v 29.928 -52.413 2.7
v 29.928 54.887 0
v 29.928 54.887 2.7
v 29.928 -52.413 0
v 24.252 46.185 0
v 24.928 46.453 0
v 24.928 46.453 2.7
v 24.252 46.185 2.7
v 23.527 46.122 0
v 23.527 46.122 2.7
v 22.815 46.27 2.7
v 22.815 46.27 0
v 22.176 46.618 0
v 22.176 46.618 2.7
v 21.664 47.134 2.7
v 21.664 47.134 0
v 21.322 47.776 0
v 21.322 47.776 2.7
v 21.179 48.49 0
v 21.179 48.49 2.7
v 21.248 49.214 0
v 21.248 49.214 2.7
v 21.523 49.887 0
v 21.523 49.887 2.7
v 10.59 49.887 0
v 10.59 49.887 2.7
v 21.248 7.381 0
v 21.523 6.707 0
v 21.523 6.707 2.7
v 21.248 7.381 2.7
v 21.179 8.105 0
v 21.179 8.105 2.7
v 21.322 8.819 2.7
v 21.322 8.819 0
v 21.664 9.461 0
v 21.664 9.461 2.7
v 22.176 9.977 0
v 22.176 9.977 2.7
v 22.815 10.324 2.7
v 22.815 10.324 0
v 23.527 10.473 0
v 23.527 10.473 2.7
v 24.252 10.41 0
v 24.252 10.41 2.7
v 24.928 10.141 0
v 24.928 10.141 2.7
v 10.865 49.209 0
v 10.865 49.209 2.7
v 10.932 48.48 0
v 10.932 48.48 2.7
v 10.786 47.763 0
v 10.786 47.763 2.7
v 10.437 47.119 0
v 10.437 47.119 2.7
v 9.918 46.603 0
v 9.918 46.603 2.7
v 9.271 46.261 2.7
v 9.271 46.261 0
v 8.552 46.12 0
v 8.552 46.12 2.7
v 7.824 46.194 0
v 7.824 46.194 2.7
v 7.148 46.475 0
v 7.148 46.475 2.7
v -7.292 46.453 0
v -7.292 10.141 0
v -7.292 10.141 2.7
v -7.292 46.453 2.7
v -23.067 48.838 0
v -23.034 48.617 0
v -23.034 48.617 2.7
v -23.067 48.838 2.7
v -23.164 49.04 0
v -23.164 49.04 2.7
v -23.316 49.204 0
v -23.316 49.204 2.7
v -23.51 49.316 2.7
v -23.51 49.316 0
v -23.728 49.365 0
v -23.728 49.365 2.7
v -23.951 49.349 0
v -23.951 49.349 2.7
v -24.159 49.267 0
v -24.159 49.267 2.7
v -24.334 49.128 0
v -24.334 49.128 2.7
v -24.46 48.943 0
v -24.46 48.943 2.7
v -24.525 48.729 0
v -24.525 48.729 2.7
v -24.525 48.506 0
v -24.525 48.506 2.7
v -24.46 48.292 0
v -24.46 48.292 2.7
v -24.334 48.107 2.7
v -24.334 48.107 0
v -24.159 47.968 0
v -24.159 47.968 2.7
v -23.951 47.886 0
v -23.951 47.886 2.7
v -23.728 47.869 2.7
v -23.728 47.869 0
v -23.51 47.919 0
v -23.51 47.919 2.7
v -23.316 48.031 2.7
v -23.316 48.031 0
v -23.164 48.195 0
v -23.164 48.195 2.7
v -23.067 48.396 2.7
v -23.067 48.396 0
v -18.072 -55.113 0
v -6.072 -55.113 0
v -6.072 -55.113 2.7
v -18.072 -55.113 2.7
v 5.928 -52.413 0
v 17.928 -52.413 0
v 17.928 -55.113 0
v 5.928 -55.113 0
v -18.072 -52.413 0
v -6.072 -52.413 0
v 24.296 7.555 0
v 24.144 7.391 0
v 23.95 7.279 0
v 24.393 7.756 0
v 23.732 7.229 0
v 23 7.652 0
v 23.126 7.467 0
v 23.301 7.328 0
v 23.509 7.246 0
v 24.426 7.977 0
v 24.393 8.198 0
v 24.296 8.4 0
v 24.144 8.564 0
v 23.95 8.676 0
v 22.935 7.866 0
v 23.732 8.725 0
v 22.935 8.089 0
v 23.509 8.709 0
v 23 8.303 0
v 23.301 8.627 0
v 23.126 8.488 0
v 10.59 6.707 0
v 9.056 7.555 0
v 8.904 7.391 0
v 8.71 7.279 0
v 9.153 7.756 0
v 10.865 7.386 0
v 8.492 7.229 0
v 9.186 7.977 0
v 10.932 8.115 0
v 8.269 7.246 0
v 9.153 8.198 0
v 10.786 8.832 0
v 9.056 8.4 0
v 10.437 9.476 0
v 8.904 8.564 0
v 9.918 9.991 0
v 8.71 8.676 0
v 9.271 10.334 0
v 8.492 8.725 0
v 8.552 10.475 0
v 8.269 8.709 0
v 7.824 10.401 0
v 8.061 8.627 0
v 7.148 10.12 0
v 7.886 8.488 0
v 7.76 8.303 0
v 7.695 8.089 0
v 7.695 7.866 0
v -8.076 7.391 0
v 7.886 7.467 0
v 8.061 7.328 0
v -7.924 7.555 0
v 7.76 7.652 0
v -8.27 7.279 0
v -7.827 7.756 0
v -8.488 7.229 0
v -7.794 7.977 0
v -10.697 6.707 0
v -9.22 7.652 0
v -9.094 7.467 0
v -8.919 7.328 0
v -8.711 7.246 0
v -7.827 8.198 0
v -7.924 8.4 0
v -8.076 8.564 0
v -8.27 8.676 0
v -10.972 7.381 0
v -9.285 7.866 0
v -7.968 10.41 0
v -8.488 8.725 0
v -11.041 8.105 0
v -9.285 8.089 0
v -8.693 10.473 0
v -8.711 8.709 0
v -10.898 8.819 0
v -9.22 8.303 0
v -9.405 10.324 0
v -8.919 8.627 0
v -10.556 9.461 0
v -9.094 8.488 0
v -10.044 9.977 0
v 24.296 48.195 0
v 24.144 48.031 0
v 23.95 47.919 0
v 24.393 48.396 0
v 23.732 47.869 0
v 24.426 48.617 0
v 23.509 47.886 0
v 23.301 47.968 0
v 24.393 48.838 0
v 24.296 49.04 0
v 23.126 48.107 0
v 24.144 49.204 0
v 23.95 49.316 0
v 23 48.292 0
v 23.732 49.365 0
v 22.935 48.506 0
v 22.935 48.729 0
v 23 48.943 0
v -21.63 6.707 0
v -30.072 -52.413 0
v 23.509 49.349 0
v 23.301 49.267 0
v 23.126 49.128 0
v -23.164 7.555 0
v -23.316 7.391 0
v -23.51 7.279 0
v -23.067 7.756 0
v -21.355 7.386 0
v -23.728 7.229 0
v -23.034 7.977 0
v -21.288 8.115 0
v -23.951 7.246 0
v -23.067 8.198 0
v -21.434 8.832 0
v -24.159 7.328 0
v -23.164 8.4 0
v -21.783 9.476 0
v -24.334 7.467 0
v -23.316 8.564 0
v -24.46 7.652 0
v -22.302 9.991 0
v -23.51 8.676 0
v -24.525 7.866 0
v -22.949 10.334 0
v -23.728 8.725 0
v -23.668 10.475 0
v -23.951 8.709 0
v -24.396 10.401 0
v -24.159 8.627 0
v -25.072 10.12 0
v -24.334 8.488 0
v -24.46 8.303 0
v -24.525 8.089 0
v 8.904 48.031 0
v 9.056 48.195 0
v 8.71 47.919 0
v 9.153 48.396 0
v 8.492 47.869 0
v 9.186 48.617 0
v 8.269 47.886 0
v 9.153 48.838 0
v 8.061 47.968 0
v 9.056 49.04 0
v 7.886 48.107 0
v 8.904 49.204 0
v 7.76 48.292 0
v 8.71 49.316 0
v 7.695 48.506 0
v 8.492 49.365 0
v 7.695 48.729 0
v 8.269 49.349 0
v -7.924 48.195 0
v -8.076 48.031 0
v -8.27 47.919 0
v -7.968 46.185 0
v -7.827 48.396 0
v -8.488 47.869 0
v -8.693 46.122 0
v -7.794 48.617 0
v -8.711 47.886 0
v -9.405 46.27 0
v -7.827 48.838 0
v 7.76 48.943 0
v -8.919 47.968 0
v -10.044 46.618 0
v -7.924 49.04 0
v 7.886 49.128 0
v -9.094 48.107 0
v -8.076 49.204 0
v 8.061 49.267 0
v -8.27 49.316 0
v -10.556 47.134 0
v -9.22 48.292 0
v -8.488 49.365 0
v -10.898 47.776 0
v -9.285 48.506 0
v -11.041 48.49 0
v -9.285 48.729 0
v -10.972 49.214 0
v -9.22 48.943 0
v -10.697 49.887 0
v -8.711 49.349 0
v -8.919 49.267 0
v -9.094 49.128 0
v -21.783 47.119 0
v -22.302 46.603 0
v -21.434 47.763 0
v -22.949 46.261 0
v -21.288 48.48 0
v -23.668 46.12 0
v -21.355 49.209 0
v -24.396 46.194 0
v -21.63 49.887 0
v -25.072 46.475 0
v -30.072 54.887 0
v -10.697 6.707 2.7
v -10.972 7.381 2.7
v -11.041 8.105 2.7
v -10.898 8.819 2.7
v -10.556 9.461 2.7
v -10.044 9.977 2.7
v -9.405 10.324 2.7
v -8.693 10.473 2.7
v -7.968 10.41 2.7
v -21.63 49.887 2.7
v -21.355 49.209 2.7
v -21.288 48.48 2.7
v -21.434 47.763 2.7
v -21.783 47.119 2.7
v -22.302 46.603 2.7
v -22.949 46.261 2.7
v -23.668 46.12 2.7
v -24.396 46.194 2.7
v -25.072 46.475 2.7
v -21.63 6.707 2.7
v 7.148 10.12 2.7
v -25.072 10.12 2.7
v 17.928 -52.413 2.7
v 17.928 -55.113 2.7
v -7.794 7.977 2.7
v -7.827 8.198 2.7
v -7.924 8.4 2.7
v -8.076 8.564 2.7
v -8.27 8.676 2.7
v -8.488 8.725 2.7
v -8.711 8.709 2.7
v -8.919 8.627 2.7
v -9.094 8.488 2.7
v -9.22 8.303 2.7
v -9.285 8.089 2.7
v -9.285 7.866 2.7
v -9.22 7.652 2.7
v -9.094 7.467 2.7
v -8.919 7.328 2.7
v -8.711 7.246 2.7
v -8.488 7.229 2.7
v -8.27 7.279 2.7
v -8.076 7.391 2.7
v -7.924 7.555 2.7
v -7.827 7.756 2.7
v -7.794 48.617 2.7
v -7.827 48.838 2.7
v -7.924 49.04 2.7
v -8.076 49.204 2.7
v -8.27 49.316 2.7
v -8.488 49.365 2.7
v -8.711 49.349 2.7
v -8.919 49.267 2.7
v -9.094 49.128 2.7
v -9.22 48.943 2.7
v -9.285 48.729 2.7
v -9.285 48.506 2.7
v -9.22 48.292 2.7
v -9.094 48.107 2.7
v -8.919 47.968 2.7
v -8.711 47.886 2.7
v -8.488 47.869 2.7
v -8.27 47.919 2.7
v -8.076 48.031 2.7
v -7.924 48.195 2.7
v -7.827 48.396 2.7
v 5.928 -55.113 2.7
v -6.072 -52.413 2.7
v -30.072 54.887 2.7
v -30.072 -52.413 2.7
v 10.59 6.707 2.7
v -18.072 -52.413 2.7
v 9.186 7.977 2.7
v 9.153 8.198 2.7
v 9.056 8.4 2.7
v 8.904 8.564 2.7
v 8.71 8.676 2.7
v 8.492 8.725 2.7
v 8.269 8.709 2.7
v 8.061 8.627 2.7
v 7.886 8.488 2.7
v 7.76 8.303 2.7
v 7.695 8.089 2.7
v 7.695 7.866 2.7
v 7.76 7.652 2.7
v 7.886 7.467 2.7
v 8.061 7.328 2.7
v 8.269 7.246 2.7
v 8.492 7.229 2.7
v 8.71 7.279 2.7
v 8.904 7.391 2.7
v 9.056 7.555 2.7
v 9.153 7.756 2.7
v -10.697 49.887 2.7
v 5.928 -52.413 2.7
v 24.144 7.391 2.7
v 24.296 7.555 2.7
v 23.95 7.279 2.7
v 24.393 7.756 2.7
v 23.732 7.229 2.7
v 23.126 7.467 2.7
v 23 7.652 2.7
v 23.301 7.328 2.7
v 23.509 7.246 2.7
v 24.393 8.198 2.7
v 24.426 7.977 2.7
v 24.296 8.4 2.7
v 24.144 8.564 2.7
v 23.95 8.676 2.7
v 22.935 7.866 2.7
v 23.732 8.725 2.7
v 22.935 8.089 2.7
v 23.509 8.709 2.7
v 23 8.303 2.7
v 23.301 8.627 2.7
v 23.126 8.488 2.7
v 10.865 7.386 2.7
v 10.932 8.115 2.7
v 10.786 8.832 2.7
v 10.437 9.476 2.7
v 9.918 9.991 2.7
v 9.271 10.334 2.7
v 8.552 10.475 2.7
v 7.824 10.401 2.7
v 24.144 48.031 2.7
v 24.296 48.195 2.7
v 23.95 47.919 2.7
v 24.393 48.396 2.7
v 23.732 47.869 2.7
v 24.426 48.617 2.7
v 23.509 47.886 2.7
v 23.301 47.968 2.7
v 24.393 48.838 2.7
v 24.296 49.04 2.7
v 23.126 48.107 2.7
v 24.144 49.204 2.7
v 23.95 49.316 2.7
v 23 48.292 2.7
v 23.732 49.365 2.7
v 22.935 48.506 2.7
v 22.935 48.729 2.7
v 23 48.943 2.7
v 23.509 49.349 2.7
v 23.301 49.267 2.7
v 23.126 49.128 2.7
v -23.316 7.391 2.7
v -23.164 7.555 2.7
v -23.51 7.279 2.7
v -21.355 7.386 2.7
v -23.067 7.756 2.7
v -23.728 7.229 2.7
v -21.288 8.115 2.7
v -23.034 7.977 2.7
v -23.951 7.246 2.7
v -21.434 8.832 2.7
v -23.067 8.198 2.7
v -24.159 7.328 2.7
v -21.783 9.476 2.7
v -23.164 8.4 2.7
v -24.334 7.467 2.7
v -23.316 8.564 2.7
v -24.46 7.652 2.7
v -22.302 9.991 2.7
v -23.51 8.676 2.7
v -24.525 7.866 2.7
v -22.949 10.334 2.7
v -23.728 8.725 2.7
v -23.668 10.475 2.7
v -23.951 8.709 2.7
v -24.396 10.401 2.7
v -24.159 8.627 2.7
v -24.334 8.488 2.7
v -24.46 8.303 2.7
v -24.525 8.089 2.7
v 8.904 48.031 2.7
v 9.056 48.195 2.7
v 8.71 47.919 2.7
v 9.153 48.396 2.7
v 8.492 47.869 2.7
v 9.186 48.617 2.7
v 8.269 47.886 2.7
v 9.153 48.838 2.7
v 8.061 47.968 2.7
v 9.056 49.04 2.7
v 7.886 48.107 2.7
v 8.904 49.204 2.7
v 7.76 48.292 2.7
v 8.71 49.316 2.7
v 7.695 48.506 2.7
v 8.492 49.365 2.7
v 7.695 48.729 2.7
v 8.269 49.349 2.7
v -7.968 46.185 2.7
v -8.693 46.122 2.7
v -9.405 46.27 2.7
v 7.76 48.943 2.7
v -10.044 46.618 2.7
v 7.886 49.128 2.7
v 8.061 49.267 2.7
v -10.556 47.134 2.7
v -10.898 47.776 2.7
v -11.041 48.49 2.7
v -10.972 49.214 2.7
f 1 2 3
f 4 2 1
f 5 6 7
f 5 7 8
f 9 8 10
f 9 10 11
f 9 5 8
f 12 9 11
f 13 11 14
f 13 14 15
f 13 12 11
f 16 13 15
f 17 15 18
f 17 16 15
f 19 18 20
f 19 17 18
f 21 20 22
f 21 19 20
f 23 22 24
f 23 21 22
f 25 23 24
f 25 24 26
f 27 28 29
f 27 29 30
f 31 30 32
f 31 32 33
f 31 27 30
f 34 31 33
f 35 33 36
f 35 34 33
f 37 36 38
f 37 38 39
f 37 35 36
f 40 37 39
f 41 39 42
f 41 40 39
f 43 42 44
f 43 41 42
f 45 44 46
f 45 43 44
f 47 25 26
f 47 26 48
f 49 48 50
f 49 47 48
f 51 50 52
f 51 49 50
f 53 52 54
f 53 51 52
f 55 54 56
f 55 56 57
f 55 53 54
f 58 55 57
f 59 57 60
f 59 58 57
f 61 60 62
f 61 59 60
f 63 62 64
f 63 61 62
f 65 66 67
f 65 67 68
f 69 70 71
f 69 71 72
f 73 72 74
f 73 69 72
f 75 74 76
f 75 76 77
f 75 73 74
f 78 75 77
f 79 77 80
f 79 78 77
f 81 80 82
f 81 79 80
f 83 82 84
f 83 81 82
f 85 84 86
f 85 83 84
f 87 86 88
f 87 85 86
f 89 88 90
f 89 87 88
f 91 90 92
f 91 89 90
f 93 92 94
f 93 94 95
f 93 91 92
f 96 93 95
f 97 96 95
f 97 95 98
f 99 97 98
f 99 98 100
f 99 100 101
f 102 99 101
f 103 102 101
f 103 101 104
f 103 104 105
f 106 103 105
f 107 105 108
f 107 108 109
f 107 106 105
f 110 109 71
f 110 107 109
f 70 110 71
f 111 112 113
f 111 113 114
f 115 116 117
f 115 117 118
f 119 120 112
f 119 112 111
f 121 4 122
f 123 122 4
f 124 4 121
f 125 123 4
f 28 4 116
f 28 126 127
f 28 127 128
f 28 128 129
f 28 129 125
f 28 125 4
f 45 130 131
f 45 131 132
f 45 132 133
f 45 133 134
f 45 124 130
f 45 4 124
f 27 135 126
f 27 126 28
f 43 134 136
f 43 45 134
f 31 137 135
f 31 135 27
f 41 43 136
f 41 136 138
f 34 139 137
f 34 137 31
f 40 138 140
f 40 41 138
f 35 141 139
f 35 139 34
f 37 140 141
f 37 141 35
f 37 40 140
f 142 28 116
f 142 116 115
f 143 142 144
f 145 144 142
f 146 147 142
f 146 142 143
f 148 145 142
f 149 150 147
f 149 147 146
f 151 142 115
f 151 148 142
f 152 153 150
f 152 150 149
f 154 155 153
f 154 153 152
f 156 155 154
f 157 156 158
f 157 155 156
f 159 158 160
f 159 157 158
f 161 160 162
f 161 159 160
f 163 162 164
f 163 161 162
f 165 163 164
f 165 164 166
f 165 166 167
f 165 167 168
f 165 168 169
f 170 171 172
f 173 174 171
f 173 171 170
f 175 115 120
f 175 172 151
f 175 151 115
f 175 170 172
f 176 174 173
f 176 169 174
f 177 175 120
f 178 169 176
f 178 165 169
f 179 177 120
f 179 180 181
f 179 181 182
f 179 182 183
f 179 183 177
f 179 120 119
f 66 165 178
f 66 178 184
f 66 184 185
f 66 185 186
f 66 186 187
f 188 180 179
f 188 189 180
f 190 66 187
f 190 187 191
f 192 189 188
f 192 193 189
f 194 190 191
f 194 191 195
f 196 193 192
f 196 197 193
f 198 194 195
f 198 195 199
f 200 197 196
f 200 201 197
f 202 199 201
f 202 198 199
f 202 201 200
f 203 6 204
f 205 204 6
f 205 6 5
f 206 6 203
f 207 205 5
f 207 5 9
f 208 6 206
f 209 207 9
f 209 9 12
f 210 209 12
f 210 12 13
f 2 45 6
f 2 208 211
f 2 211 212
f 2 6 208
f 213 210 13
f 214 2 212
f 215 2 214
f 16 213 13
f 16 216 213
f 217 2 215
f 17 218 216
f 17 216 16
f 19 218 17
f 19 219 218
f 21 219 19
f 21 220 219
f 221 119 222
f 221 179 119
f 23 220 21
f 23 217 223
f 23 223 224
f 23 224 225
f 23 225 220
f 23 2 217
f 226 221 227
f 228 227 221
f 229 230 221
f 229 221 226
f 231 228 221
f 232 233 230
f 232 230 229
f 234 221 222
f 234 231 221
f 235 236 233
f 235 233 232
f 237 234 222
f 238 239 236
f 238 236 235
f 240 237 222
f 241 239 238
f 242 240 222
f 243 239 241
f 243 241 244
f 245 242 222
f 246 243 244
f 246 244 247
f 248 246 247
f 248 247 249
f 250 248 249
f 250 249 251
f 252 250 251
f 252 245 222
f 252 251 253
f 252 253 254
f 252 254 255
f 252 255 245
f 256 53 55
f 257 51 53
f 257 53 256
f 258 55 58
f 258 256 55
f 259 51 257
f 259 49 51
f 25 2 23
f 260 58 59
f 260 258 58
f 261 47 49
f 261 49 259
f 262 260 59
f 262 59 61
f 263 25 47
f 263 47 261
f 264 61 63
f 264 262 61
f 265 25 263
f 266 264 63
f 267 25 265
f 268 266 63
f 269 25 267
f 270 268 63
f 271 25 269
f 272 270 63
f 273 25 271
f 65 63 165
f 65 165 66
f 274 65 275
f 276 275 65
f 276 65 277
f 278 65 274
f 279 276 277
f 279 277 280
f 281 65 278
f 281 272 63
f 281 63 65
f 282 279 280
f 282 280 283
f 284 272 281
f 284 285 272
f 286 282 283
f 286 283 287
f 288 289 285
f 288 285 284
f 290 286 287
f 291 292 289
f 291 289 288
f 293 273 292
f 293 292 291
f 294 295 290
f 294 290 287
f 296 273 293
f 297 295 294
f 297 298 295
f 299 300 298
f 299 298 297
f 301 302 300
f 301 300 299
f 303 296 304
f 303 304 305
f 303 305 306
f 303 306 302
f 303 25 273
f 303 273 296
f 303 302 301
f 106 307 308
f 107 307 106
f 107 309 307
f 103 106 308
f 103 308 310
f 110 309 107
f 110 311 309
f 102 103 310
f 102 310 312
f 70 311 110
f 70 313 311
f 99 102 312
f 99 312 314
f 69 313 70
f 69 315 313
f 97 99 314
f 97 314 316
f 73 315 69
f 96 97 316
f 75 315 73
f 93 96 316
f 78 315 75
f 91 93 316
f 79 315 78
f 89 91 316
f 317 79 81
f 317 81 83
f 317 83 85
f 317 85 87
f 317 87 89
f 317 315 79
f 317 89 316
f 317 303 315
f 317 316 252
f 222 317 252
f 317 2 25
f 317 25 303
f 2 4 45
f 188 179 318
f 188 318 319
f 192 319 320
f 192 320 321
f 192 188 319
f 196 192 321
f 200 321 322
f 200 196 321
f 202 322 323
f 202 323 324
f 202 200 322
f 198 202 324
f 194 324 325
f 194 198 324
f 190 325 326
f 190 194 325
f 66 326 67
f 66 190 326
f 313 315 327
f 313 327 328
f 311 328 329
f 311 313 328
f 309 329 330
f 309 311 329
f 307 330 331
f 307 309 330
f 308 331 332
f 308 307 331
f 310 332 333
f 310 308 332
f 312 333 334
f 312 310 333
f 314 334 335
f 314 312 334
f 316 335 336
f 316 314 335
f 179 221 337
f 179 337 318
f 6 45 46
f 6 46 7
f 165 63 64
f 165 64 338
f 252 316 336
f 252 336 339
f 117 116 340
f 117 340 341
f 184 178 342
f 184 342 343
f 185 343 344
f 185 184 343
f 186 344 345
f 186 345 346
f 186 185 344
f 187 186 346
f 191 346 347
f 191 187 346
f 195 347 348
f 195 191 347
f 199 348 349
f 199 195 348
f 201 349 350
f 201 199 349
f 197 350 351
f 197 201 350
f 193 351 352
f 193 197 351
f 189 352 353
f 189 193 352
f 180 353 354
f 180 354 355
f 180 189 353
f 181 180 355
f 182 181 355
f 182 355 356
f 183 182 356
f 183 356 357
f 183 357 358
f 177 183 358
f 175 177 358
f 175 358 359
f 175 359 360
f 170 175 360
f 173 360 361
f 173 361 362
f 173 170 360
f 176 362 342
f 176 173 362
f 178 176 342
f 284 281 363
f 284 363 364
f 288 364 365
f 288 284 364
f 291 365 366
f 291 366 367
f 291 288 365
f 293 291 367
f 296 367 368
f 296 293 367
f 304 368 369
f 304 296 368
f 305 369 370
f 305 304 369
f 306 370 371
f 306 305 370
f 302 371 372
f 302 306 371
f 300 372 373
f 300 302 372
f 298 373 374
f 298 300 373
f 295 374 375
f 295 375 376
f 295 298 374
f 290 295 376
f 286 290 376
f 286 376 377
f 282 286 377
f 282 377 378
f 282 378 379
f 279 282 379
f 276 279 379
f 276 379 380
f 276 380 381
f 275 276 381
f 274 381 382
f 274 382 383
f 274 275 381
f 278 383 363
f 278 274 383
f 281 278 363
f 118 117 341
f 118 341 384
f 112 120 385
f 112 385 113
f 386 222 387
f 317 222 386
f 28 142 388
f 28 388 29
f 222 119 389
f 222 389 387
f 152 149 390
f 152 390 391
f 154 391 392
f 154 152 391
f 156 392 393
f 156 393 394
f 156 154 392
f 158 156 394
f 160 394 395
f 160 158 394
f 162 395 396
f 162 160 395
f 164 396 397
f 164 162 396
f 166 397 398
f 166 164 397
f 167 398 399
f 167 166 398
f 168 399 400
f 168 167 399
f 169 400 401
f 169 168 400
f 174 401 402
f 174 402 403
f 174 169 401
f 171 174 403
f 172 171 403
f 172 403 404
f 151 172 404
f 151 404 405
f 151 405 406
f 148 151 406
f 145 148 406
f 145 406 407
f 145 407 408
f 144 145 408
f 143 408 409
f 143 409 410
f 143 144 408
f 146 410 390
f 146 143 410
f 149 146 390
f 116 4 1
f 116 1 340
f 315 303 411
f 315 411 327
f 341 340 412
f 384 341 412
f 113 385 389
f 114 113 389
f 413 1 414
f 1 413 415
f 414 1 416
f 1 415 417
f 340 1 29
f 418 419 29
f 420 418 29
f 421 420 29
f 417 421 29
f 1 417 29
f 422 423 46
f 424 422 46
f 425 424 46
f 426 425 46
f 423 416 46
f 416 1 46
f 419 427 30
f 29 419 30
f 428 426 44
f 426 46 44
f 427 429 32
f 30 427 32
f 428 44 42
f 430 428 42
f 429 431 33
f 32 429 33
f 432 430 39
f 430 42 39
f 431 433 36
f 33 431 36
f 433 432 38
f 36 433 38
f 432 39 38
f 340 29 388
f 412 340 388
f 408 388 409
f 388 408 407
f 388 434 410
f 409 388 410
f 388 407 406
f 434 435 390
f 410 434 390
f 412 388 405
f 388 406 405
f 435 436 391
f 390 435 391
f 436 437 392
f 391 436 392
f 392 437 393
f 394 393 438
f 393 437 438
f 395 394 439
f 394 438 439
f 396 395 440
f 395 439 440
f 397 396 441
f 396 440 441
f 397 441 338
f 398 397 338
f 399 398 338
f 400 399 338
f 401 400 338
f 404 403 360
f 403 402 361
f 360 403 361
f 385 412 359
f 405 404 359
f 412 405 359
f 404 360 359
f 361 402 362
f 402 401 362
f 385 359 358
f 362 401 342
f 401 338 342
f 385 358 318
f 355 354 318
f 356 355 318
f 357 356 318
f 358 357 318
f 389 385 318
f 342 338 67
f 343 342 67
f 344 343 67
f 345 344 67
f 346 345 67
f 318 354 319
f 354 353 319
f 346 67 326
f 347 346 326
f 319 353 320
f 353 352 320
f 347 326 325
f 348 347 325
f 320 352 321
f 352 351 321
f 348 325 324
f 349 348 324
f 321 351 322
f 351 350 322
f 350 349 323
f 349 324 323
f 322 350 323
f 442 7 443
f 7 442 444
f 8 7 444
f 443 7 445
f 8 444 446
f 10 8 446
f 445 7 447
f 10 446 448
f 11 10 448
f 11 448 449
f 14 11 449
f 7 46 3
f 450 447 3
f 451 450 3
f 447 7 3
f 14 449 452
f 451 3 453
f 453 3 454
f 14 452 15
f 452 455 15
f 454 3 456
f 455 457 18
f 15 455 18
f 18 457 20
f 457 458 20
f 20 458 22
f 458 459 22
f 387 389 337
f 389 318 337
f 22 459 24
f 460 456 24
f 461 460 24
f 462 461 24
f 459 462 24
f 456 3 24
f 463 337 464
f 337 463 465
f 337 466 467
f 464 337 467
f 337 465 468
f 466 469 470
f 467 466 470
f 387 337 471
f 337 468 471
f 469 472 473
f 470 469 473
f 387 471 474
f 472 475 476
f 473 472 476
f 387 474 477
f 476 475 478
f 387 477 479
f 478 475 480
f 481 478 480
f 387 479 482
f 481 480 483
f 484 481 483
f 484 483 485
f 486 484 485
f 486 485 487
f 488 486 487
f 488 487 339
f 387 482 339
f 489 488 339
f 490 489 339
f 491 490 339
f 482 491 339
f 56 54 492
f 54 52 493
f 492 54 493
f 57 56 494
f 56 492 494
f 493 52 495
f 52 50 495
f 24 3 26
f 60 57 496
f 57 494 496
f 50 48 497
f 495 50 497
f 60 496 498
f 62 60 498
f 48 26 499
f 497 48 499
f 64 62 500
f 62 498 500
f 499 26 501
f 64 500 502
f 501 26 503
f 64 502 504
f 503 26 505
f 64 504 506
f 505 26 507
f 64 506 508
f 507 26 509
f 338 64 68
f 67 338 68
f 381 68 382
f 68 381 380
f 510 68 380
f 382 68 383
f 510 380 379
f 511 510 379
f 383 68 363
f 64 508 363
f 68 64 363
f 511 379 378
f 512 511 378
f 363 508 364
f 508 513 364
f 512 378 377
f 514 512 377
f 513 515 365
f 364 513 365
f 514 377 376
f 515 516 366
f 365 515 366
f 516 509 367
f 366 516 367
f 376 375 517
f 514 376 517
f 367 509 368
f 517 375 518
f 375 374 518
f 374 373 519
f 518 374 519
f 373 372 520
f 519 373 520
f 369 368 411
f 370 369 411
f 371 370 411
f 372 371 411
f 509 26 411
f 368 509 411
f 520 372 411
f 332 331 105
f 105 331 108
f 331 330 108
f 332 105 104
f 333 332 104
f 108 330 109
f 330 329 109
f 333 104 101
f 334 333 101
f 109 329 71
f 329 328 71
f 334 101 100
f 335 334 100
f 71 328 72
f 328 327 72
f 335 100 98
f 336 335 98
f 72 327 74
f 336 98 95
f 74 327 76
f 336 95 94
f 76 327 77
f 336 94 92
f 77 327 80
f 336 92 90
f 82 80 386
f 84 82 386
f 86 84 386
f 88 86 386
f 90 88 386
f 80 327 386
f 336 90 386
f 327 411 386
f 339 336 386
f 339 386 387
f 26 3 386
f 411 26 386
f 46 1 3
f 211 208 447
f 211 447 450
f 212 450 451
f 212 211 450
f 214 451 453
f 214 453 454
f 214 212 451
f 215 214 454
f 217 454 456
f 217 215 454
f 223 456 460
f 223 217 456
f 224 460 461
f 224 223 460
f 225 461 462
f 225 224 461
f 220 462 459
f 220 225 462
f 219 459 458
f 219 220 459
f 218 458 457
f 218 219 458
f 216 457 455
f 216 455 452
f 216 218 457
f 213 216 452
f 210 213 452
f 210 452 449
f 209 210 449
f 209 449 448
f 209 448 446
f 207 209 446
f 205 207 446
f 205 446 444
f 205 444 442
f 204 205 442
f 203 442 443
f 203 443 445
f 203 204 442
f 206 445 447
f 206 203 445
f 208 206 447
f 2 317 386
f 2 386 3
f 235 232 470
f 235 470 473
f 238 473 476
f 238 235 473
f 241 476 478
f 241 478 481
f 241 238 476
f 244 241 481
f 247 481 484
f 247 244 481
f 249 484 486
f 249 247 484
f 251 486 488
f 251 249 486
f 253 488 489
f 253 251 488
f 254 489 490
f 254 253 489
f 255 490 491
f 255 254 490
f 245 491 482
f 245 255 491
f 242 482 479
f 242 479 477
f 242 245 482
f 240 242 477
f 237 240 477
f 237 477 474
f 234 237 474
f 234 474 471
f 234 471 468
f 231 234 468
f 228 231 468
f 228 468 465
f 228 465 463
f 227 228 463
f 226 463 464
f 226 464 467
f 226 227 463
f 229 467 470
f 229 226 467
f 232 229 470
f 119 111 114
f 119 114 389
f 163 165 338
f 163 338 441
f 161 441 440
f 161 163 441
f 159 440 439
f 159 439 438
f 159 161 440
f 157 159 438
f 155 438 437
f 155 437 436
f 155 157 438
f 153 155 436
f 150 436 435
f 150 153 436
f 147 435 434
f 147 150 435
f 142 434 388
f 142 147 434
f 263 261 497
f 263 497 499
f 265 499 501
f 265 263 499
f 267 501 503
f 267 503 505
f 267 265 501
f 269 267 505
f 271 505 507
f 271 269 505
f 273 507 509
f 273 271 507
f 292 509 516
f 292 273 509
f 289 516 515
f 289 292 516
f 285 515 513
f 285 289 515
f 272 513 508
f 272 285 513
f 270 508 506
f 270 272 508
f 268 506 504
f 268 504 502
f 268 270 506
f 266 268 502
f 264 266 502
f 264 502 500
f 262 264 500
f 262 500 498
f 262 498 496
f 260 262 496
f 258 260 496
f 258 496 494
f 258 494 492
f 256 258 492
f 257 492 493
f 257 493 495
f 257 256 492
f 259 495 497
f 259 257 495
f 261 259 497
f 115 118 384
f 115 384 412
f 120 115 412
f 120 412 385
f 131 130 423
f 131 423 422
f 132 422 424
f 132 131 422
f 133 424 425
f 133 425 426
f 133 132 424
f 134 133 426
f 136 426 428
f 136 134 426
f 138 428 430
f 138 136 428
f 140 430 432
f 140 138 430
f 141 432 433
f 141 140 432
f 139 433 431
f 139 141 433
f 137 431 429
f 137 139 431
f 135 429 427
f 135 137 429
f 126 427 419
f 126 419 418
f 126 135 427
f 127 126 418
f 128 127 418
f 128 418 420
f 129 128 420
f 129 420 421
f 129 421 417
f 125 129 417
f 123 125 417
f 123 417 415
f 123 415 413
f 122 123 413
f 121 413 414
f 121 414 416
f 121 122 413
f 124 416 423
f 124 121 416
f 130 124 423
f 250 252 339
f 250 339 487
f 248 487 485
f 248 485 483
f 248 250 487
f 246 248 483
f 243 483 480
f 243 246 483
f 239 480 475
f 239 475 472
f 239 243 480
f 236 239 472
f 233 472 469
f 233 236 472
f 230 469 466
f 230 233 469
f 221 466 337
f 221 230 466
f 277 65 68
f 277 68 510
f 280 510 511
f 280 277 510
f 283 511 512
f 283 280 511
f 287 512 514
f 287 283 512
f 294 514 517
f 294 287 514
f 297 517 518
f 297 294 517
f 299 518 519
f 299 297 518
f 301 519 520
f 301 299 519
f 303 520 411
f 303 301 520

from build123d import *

# Parameters (mm, degrees)
SKETCH1_R           = 0.75
BOSS_EXTRUDE1_DEPTH = 2.7


with BuildPart() as part:
    # Sketch1 → Boss-Extrude1 (new body)
    with BuildSketch(Plane.XY):
        Polygon((-30.072121707, -52.412620775), (-30.072121707, 54.887379225), (29.927878293, 54.887379225), (29.927878293, -52.412620775), (17.927878293, -52.412620775), (17.927878293, -55.112620775), (5.927878293, -55.112620775), (5.927878293, -52.412620775), (-6.072121707, -52.412620775), (-6.072121707, -55.112620775), (-18.072121707, -55.112620775), (-18.072121707, -52.412620775), align=None)
        with Locations((-8.543810279, 48.617379225)):
            Circle(SKETCH1_R, mode=Mode.SUBTRACT)
        with Locations((-8.543810279, 7.977379225)):
            Circle(SKETCH1_R, mode=Mode.SUBTRACT)
        with Locations((-23.783810279, 7.977379225)):
            Circle(SKETCH1_R, mode=Mode.SUBTRACT)
        with Locations((-23.783810279, 48.617379225)):
            Circle(SKETCH1_R, mode=Mode.SUBTRACT)
        with Locations((23.676189721, 48.617379225)):
            Circle(SKETCH1_R, mode=Mode.SUBTRACT)
        with Locations((23.676189721, 7.977379225)):
            Circle(SKETCH1_R, mode=Mode.SUBTRACT)
        with Locations((8.436189721, 7.977379225)):
            Circle(SKETCH1_R, mode=Mode.SUBTRACT)
        with Locations((8.436189721, 48.617379225)):
            Circle(SKETCH1_R, mode=Mode.SUBTRACT)
        with BuildLine():
            Line((-10.697202951, 49.887379225), (-21.630417607, 49.887379225))
            ThreePointArc((-21.630417607, 49.887379225), (-22.023594521, 46.842093195), (-25.072121707, 46.474891496))
            Line((-25.072121707, 46.474891496), (-25.072121707, 10.119866953))
            ThreePointArc((-25.072121707, 10.119866953), (-22.023594521, 9.752665254), (-21.630417607, 6.707379225))
            Line((-21.630417607, 6.707379225), (-10.697202951, 6.707379225))
            ThreePointArc((-10.697202951, 6.707379225), (-10.319058772, 9.73763284), (-7.292121707, 10.141466958))
            Line((-7.292121707, 10.141466958), (-7.292121707, 46.453291491))
            ThreePointArc((-7.292121707, 46.453291491), (-10.319058772, 46.85712561), (-10.697202951, 49.887379225))
        make_face(mode=Mode.SUBTRACT)
        with BuildLine():
            Line((21.522797049, 49.887379225), (10.589582393, 49.887379225))
            ThreePointArc((10.589582393, 49.887379225), (10.196405479, 46.842093195), (7.147878293, 46.474891496))
            Line((7.147878293, 46.474891496), (7.147878293, 10.119866953))
            ThreePointArc((7.147878293, 10.119866953), (10.196405479, 9.752665254), (10.589582393, 6.707379225))
            Line((10.589582393, 6.707379225), (21.522797049, 6.707379225))
            ThreePointArc((21.522797049, 6.707379225), (21.900941228, 9.73763284), (24.927878293, 10.141466958))
            Line((24.927878293, 10.141466958), (24.927878293, 46.453291491))
            ThreePointArc((24.927878293, 46.453291491), (21.900941228, 46.85712561), (21.522797049, 49.887379225))
        make_face(mode=Mode.SUBTRACT)
    extrude(amount=BOSS_EXTRUDE1_DEPTH)


solid = part.part
